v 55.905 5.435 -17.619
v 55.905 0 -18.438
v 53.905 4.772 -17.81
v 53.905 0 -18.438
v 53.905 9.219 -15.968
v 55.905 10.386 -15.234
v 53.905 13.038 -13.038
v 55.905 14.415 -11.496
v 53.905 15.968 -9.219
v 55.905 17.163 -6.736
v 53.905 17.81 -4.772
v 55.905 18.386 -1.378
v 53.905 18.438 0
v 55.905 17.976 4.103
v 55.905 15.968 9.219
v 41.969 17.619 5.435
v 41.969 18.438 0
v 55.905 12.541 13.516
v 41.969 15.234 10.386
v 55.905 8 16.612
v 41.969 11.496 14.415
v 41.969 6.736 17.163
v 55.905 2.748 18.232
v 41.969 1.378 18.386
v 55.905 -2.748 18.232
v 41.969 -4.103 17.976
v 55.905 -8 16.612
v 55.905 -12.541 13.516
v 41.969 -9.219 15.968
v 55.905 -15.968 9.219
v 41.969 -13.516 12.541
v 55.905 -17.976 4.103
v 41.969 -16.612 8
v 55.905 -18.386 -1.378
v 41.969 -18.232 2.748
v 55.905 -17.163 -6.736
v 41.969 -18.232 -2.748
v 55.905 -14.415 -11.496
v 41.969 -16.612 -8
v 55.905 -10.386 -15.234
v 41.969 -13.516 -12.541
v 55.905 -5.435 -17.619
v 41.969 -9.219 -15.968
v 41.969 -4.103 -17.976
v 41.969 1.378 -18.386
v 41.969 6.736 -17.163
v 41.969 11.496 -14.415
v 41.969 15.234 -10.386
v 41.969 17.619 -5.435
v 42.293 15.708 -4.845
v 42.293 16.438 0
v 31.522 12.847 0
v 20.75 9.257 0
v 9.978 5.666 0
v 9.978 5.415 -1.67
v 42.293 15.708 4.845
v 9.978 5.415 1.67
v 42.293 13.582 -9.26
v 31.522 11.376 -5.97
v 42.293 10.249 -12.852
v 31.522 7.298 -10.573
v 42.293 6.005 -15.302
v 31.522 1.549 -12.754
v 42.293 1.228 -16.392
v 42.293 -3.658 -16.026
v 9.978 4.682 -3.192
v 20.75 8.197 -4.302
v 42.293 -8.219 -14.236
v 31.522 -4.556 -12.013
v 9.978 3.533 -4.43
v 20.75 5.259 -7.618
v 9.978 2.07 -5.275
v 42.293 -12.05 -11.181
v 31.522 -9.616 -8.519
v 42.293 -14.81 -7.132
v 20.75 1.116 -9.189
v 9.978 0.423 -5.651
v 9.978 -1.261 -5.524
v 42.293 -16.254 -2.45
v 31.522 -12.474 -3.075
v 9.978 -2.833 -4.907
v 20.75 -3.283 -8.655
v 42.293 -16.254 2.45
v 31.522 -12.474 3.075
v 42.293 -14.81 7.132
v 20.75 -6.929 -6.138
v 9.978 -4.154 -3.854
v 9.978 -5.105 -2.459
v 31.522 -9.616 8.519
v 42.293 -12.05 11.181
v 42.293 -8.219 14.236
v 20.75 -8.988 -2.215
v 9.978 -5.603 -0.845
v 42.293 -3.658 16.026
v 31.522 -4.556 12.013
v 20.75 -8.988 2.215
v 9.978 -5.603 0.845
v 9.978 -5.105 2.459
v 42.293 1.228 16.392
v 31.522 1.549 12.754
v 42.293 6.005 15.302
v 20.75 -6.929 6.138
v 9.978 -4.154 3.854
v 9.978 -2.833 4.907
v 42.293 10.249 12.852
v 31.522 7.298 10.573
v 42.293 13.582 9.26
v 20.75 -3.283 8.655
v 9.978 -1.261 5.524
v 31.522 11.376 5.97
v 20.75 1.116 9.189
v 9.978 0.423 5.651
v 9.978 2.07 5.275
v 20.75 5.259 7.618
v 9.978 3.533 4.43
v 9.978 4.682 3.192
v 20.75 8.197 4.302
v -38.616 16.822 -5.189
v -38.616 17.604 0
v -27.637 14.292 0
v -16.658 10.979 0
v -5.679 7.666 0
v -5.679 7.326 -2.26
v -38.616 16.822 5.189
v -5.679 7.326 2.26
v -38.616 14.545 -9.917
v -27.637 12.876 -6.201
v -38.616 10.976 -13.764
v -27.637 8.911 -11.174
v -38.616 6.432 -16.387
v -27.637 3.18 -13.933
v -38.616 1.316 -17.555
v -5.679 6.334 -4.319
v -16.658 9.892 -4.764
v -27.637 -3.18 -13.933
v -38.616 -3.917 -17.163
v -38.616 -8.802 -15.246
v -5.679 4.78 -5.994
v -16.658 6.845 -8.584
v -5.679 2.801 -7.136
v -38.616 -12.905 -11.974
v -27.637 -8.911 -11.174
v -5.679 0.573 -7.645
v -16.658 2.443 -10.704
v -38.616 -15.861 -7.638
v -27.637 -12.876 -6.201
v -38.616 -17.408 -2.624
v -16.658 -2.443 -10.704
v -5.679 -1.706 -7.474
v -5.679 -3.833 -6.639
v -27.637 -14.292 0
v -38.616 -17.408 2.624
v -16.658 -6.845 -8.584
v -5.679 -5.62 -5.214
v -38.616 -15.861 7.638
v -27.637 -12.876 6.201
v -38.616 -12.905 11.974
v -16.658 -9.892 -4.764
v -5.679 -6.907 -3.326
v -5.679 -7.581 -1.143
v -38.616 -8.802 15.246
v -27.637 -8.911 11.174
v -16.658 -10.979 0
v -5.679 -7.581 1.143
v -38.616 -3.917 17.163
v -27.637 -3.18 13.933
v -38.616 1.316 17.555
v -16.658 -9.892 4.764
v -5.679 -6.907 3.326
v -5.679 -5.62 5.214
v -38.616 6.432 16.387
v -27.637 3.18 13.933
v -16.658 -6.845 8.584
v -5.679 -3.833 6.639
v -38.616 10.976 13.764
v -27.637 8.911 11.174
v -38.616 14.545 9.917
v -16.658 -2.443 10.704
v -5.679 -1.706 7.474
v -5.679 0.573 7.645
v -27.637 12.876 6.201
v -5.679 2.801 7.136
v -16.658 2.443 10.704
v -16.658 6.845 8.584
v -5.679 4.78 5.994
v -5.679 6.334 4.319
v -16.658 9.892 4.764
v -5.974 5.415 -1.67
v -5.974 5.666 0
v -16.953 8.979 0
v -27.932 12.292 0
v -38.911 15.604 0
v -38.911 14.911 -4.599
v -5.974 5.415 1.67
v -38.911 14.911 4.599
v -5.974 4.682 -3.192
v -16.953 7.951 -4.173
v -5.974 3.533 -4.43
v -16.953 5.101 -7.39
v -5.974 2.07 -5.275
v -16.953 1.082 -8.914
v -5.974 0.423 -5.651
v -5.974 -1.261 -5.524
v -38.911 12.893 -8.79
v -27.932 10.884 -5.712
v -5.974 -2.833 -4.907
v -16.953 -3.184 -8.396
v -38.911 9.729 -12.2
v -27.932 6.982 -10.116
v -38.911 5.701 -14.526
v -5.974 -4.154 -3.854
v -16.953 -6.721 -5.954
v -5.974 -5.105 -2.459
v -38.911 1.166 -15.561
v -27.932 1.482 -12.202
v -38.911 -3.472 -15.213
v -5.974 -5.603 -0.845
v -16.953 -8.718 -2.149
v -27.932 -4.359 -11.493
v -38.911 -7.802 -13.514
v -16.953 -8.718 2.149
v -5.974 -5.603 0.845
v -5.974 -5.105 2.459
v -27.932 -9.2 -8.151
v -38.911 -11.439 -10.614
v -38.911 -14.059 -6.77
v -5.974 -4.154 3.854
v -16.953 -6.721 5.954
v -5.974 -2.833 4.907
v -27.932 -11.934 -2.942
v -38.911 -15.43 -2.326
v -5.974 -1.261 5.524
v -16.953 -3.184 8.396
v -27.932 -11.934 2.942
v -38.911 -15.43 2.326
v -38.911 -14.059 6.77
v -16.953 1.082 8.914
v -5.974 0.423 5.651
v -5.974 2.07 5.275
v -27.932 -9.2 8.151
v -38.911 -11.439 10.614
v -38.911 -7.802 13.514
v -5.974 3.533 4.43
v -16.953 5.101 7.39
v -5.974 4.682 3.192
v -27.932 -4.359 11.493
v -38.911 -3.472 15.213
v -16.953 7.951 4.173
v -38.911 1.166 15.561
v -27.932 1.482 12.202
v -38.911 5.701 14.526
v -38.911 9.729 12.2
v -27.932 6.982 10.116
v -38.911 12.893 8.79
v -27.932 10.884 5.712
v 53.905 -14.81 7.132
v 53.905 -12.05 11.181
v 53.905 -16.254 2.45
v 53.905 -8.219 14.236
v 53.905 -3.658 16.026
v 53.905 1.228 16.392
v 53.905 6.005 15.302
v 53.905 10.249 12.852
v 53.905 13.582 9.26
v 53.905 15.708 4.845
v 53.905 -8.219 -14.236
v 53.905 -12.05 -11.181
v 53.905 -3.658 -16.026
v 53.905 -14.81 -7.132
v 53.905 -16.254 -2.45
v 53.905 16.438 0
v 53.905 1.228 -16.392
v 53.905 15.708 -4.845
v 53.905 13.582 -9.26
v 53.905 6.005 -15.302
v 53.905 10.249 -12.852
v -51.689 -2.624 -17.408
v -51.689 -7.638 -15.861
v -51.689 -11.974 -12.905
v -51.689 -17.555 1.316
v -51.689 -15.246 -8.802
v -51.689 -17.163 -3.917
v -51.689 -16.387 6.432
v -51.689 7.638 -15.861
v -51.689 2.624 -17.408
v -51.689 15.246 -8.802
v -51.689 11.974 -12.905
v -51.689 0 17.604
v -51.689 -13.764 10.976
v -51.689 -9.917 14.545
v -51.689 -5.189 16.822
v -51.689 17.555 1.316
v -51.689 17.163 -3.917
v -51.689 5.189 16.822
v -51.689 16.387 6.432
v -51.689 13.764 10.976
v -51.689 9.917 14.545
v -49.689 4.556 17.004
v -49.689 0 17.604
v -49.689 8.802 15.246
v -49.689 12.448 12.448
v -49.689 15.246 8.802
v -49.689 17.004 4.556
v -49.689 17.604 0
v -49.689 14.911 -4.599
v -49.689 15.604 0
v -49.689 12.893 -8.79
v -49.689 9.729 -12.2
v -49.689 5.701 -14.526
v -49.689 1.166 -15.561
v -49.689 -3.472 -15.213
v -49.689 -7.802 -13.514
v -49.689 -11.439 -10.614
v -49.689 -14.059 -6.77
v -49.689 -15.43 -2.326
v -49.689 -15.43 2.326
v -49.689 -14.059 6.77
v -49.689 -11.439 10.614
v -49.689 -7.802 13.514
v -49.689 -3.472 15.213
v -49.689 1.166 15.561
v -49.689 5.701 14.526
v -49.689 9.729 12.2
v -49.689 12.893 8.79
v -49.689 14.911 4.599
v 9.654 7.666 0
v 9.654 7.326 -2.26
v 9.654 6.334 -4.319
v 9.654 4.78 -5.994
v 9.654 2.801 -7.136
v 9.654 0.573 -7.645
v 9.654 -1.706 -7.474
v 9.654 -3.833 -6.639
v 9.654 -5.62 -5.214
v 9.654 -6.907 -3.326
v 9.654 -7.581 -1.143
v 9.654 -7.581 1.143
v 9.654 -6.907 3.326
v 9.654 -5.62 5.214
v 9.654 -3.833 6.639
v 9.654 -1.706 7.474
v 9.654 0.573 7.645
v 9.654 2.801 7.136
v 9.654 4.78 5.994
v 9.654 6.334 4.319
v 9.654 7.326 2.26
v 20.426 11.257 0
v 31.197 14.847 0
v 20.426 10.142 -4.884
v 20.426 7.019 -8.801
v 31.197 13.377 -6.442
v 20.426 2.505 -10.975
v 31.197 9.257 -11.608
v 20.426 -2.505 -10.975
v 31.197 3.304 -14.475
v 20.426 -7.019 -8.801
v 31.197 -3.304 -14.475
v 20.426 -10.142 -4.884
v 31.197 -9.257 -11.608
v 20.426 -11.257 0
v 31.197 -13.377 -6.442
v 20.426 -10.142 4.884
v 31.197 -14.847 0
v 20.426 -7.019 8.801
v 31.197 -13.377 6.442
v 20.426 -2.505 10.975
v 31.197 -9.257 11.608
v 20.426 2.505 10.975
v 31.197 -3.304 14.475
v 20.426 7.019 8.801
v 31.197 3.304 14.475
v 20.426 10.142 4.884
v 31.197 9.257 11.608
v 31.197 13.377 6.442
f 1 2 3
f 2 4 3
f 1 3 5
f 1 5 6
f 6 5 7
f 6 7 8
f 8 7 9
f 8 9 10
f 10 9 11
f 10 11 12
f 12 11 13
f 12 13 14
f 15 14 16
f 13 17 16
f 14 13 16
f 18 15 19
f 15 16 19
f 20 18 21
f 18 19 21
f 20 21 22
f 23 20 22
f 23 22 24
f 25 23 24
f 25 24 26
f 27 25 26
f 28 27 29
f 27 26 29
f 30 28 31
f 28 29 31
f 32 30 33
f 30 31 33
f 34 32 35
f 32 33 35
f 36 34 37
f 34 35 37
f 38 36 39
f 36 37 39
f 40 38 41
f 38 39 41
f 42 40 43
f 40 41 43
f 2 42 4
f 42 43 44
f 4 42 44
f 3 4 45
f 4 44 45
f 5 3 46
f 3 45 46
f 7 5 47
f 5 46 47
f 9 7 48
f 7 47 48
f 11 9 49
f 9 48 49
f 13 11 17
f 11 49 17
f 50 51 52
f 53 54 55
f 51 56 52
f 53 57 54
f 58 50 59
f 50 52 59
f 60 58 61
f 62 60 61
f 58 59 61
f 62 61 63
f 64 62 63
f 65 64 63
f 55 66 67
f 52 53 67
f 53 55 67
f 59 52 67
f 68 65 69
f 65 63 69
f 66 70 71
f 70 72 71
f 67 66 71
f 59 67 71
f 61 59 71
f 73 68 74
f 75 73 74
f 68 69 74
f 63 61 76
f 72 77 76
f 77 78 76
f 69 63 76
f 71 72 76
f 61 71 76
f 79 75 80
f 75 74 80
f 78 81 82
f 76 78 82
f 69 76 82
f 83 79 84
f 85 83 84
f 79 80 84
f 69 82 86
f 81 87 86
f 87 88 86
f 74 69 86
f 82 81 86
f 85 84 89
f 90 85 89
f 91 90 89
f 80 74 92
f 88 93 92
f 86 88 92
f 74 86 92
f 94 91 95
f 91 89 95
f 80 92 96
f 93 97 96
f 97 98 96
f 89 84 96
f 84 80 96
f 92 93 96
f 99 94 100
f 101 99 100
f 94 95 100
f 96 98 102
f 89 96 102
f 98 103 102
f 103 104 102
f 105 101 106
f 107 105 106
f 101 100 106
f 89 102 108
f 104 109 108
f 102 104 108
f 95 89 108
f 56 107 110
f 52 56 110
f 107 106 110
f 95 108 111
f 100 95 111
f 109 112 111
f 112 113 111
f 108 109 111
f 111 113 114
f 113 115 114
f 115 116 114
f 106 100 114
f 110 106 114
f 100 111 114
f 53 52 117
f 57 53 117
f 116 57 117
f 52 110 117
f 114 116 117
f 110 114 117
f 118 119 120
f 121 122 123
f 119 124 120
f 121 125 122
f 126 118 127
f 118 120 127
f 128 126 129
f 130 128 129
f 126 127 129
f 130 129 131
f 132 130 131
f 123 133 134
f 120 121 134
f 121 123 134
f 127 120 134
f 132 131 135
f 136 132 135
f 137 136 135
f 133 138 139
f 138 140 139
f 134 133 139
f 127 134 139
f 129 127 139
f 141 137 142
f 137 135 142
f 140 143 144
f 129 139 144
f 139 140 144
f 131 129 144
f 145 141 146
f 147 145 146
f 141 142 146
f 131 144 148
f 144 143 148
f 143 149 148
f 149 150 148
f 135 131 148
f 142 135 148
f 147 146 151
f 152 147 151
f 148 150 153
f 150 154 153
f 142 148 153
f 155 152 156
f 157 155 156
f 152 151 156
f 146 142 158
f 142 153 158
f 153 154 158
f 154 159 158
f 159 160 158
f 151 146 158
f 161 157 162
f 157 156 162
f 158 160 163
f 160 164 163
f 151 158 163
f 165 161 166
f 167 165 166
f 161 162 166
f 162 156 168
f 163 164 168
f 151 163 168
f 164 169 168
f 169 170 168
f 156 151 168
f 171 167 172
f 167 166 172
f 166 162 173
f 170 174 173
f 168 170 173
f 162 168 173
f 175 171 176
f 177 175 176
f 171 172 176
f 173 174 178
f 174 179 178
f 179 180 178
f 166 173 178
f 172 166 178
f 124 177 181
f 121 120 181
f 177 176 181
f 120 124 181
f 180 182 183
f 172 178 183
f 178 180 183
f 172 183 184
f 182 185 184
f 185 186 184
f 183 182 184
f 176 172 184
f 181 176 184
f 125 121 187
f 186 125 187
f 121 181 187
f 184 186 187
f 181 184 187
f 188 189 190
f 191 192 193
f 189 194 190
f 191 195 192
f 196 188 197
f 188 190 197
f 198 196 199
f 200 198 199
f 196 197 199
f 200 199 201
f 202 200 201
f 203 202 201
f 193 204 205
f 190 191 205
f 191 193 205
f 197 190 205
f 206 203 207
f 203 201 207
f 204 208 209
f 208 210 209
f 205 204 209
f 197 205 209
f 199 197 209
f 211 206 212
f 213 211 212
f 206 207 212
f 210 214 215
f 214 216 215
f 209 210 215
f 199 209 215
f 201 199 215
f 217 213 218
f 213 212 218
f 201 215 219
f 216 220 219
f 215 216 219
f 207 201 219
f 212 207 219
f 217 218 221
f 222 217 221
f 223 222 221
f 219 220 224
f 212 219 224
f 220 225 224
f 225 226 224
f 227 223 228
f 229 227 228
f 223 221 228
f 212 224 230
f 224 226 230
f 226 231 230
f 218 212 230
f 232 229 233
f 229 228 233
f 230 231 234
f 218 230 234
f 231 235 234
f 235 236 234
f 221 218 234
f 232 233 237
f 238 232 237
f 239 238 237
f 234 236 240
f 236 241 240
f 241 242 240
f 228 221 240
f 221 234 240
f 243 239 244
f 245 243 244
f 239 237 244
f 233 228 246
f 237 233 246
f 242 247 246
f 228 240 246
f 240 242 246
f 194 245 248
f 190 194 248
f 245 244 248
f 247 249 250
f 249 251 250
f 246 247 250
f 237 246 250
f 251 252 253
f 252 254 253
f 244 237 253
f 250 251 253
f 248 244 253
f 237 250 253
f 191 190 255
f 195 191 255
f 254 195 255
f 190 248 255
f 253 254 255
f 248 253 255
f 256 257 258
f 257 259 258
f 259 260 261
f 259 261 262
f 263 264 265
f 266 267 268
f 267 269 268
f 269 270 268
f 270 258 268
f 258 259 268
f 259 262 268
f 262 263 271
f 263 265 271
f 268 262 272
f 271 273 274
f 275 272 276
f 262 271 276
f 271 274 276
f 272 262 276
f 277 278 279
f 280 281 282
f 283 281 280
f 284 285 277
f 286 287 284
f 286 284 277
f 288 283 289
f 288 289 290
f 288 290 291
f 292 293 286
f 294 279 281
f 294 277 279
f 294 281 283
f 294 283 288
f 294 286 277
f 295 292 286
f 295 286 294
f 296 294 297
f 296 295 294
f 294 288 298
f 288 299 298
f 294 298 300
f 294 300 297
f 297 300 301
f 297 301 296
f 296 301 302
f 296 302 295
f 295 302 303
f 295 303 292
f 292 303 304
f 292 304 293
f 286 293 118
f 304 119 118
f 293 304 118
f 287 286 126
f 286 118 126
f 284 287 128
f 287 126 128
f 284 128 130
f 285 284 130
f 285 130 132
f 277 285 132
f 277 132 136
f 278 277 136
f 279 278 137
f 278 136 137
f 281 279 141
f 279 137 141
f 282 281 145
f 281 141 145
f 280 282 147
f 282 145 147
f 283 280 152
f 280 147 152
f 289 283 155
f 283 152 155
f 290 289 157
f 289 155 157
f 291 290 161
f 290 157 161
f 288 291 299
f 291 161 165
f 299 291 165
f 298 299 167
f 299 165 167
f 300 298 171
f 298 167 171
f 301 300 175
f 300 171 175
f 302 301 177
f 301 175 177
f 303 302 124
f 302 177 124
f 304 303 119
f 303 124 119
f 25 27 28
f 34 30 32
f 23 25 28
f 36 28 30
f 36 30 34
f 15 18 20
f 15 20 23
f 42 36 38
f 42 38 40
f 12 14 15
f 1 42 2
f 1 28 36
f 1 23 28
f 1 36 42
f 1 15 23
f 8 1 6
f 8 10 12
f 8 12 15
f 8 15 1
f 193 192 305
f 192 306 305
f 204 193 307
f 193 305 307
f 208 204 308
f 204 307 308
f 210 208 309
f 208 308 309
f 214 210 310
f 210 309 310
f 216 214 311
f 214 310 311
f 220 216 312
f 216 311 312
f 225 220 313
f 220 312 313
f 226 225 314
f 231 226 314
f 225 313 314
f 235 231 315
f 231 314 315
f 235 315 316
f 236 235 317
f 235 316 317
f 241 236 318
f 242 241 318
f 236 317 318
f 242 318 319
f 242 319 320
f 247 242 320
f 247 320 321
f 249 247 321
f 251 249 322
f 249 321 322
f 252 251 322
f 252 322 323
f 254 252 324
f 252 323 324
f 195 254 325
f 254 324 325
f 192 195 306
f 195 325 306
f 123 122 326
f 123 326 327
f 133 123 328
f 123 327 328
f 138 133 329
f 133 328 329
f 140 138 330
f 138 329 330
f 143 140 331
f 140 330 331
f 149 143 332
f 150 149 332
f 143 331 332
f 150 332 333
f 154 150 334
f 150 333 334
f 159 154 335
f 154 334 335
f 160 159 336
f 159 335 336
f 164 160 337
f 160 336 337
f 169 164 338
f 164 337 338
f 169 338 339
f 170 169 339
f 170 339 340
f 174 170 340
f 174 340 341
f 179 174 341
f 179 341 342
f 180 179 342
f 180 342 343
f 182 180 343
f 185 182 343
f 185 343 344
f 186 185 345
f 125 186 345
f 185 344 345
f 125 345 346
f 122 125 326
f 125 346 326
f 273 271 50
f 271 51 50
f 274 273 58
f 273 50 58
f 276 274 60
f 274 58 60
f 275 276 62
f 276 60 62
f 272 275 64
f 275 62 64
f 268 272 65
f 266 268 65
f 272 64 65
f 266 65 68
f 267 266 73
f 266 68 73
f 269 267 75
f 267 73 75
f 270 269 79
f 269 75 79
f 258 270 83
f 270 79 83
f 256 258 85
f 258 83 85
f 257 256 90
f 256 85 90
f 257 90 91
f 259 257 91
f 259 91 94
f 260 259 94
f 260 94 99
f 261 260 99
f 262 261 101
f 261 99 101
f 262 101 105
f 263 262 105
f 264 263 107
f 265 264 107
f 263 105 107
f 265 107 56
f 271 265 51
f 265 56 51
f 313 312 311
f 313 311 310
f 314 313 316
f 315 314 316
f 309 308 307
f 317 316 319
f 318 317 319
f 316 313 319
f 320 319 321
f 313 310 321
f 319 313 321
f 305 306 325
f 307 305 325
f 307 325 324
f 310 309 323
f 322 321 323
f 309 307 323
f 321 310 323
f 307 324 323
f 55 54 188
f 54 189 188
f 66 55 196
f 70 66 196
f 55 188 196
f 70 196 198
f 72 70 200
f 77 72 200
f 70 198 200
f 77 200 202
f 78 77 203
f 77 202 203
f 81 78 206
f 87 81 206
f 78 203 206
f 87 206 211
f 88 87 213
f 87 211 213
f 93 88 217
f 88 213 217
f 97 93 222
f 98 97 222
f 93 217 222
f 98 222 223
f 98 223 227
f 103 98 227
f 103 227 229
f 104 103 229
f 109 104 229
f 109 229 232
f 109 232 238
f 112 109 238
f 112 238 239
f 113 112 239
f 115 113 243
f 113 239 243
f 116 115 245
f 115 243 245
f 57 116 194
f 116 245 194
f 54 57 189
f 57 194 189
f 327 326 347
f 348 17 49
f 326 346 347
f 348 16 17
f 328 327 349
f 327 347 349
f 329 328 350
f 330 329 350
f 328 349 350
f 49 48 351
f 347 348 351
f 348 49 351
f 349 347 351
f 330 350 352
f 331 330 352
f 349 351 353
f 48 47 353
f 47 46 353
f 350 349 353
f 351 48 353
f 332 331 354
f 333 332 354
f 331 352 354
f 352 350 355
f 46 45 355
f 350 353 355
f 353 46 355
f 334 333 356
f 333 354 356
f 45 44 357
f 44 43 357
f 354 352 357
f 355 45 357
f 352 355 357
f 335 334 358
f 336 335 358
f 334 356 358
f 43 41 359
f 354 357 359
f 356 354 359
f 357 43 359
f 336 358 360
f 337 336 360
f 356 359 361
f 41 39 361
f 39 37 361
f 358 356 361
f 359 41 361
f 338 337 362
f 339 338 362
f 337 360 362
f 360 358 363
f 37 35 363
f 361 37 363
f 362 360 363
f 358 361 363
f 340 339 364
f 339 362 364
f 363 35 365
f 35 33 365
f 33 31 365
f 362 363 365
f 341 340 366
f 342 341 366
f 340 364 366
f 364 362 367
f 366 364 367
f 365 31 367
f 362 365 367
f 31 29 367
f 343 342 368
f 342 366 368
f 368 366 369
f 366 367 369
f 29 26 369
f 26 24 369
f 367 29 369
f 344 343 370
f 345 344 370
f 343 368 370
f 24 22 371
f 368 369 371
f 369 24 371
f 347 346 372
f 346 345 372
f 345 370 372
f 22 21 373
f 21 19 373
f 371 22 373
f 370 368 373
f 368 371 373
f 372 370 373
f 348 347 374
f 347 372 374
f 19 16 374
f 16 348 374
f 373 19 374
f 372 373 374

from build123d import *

# Parameters (mm, degrees)
SKETCH2_R           = 17.604244625
BOSS_EXTRUDE1_DEPTH = 2
SKETCH3_R           = 18.437955777
BOSS_EXTRUDE2_DEPTH = 2


with BuildPart() as part:
    # Sketch1 → Revolve-Thin2 (revolve)
    with BuildSketch(Plane.XY):
        Polygon((-49.689400151, 17.604244625), (-38.615762403, 17.604244625), (-5.678788589, 7.666364595), (9.653940601, 7.666364595), (41.968714147, 18.437955777), (53.905013296, 18.437955777), (53.905013296, 16.437955777), (42.293269467, 16.437955777), (9.978495921, 5.666364595), (-5.973941532, 5.666364595), (-38.910915347, 15.604244625), (-49.689400151, 15.604244625), align=None)
    revolve(axis=Axis((0, 0, 0), (-1, 0, 0)))

    # Sketch2 → Boss-Extrude1 (add)
    with BuildSketch(Plane.ZY.offset(49.689400151)):
        Circle(SKETCH2_R)
    extrude(amount=BOSS_EXTRUDE1_DEPTH)

    # Sketch3 → Boss-Extrude2 (add)
    with BuildSketch(Plane(origin=(53.905013296, 0, 0), x_dir=(0, 0, -1), z_dir=(1, 0, 0))):
        Circle(SKETCH3_R)
    extrude(amount=BOSS_EXTRUDE2_DEPTH)


solid = part.part
